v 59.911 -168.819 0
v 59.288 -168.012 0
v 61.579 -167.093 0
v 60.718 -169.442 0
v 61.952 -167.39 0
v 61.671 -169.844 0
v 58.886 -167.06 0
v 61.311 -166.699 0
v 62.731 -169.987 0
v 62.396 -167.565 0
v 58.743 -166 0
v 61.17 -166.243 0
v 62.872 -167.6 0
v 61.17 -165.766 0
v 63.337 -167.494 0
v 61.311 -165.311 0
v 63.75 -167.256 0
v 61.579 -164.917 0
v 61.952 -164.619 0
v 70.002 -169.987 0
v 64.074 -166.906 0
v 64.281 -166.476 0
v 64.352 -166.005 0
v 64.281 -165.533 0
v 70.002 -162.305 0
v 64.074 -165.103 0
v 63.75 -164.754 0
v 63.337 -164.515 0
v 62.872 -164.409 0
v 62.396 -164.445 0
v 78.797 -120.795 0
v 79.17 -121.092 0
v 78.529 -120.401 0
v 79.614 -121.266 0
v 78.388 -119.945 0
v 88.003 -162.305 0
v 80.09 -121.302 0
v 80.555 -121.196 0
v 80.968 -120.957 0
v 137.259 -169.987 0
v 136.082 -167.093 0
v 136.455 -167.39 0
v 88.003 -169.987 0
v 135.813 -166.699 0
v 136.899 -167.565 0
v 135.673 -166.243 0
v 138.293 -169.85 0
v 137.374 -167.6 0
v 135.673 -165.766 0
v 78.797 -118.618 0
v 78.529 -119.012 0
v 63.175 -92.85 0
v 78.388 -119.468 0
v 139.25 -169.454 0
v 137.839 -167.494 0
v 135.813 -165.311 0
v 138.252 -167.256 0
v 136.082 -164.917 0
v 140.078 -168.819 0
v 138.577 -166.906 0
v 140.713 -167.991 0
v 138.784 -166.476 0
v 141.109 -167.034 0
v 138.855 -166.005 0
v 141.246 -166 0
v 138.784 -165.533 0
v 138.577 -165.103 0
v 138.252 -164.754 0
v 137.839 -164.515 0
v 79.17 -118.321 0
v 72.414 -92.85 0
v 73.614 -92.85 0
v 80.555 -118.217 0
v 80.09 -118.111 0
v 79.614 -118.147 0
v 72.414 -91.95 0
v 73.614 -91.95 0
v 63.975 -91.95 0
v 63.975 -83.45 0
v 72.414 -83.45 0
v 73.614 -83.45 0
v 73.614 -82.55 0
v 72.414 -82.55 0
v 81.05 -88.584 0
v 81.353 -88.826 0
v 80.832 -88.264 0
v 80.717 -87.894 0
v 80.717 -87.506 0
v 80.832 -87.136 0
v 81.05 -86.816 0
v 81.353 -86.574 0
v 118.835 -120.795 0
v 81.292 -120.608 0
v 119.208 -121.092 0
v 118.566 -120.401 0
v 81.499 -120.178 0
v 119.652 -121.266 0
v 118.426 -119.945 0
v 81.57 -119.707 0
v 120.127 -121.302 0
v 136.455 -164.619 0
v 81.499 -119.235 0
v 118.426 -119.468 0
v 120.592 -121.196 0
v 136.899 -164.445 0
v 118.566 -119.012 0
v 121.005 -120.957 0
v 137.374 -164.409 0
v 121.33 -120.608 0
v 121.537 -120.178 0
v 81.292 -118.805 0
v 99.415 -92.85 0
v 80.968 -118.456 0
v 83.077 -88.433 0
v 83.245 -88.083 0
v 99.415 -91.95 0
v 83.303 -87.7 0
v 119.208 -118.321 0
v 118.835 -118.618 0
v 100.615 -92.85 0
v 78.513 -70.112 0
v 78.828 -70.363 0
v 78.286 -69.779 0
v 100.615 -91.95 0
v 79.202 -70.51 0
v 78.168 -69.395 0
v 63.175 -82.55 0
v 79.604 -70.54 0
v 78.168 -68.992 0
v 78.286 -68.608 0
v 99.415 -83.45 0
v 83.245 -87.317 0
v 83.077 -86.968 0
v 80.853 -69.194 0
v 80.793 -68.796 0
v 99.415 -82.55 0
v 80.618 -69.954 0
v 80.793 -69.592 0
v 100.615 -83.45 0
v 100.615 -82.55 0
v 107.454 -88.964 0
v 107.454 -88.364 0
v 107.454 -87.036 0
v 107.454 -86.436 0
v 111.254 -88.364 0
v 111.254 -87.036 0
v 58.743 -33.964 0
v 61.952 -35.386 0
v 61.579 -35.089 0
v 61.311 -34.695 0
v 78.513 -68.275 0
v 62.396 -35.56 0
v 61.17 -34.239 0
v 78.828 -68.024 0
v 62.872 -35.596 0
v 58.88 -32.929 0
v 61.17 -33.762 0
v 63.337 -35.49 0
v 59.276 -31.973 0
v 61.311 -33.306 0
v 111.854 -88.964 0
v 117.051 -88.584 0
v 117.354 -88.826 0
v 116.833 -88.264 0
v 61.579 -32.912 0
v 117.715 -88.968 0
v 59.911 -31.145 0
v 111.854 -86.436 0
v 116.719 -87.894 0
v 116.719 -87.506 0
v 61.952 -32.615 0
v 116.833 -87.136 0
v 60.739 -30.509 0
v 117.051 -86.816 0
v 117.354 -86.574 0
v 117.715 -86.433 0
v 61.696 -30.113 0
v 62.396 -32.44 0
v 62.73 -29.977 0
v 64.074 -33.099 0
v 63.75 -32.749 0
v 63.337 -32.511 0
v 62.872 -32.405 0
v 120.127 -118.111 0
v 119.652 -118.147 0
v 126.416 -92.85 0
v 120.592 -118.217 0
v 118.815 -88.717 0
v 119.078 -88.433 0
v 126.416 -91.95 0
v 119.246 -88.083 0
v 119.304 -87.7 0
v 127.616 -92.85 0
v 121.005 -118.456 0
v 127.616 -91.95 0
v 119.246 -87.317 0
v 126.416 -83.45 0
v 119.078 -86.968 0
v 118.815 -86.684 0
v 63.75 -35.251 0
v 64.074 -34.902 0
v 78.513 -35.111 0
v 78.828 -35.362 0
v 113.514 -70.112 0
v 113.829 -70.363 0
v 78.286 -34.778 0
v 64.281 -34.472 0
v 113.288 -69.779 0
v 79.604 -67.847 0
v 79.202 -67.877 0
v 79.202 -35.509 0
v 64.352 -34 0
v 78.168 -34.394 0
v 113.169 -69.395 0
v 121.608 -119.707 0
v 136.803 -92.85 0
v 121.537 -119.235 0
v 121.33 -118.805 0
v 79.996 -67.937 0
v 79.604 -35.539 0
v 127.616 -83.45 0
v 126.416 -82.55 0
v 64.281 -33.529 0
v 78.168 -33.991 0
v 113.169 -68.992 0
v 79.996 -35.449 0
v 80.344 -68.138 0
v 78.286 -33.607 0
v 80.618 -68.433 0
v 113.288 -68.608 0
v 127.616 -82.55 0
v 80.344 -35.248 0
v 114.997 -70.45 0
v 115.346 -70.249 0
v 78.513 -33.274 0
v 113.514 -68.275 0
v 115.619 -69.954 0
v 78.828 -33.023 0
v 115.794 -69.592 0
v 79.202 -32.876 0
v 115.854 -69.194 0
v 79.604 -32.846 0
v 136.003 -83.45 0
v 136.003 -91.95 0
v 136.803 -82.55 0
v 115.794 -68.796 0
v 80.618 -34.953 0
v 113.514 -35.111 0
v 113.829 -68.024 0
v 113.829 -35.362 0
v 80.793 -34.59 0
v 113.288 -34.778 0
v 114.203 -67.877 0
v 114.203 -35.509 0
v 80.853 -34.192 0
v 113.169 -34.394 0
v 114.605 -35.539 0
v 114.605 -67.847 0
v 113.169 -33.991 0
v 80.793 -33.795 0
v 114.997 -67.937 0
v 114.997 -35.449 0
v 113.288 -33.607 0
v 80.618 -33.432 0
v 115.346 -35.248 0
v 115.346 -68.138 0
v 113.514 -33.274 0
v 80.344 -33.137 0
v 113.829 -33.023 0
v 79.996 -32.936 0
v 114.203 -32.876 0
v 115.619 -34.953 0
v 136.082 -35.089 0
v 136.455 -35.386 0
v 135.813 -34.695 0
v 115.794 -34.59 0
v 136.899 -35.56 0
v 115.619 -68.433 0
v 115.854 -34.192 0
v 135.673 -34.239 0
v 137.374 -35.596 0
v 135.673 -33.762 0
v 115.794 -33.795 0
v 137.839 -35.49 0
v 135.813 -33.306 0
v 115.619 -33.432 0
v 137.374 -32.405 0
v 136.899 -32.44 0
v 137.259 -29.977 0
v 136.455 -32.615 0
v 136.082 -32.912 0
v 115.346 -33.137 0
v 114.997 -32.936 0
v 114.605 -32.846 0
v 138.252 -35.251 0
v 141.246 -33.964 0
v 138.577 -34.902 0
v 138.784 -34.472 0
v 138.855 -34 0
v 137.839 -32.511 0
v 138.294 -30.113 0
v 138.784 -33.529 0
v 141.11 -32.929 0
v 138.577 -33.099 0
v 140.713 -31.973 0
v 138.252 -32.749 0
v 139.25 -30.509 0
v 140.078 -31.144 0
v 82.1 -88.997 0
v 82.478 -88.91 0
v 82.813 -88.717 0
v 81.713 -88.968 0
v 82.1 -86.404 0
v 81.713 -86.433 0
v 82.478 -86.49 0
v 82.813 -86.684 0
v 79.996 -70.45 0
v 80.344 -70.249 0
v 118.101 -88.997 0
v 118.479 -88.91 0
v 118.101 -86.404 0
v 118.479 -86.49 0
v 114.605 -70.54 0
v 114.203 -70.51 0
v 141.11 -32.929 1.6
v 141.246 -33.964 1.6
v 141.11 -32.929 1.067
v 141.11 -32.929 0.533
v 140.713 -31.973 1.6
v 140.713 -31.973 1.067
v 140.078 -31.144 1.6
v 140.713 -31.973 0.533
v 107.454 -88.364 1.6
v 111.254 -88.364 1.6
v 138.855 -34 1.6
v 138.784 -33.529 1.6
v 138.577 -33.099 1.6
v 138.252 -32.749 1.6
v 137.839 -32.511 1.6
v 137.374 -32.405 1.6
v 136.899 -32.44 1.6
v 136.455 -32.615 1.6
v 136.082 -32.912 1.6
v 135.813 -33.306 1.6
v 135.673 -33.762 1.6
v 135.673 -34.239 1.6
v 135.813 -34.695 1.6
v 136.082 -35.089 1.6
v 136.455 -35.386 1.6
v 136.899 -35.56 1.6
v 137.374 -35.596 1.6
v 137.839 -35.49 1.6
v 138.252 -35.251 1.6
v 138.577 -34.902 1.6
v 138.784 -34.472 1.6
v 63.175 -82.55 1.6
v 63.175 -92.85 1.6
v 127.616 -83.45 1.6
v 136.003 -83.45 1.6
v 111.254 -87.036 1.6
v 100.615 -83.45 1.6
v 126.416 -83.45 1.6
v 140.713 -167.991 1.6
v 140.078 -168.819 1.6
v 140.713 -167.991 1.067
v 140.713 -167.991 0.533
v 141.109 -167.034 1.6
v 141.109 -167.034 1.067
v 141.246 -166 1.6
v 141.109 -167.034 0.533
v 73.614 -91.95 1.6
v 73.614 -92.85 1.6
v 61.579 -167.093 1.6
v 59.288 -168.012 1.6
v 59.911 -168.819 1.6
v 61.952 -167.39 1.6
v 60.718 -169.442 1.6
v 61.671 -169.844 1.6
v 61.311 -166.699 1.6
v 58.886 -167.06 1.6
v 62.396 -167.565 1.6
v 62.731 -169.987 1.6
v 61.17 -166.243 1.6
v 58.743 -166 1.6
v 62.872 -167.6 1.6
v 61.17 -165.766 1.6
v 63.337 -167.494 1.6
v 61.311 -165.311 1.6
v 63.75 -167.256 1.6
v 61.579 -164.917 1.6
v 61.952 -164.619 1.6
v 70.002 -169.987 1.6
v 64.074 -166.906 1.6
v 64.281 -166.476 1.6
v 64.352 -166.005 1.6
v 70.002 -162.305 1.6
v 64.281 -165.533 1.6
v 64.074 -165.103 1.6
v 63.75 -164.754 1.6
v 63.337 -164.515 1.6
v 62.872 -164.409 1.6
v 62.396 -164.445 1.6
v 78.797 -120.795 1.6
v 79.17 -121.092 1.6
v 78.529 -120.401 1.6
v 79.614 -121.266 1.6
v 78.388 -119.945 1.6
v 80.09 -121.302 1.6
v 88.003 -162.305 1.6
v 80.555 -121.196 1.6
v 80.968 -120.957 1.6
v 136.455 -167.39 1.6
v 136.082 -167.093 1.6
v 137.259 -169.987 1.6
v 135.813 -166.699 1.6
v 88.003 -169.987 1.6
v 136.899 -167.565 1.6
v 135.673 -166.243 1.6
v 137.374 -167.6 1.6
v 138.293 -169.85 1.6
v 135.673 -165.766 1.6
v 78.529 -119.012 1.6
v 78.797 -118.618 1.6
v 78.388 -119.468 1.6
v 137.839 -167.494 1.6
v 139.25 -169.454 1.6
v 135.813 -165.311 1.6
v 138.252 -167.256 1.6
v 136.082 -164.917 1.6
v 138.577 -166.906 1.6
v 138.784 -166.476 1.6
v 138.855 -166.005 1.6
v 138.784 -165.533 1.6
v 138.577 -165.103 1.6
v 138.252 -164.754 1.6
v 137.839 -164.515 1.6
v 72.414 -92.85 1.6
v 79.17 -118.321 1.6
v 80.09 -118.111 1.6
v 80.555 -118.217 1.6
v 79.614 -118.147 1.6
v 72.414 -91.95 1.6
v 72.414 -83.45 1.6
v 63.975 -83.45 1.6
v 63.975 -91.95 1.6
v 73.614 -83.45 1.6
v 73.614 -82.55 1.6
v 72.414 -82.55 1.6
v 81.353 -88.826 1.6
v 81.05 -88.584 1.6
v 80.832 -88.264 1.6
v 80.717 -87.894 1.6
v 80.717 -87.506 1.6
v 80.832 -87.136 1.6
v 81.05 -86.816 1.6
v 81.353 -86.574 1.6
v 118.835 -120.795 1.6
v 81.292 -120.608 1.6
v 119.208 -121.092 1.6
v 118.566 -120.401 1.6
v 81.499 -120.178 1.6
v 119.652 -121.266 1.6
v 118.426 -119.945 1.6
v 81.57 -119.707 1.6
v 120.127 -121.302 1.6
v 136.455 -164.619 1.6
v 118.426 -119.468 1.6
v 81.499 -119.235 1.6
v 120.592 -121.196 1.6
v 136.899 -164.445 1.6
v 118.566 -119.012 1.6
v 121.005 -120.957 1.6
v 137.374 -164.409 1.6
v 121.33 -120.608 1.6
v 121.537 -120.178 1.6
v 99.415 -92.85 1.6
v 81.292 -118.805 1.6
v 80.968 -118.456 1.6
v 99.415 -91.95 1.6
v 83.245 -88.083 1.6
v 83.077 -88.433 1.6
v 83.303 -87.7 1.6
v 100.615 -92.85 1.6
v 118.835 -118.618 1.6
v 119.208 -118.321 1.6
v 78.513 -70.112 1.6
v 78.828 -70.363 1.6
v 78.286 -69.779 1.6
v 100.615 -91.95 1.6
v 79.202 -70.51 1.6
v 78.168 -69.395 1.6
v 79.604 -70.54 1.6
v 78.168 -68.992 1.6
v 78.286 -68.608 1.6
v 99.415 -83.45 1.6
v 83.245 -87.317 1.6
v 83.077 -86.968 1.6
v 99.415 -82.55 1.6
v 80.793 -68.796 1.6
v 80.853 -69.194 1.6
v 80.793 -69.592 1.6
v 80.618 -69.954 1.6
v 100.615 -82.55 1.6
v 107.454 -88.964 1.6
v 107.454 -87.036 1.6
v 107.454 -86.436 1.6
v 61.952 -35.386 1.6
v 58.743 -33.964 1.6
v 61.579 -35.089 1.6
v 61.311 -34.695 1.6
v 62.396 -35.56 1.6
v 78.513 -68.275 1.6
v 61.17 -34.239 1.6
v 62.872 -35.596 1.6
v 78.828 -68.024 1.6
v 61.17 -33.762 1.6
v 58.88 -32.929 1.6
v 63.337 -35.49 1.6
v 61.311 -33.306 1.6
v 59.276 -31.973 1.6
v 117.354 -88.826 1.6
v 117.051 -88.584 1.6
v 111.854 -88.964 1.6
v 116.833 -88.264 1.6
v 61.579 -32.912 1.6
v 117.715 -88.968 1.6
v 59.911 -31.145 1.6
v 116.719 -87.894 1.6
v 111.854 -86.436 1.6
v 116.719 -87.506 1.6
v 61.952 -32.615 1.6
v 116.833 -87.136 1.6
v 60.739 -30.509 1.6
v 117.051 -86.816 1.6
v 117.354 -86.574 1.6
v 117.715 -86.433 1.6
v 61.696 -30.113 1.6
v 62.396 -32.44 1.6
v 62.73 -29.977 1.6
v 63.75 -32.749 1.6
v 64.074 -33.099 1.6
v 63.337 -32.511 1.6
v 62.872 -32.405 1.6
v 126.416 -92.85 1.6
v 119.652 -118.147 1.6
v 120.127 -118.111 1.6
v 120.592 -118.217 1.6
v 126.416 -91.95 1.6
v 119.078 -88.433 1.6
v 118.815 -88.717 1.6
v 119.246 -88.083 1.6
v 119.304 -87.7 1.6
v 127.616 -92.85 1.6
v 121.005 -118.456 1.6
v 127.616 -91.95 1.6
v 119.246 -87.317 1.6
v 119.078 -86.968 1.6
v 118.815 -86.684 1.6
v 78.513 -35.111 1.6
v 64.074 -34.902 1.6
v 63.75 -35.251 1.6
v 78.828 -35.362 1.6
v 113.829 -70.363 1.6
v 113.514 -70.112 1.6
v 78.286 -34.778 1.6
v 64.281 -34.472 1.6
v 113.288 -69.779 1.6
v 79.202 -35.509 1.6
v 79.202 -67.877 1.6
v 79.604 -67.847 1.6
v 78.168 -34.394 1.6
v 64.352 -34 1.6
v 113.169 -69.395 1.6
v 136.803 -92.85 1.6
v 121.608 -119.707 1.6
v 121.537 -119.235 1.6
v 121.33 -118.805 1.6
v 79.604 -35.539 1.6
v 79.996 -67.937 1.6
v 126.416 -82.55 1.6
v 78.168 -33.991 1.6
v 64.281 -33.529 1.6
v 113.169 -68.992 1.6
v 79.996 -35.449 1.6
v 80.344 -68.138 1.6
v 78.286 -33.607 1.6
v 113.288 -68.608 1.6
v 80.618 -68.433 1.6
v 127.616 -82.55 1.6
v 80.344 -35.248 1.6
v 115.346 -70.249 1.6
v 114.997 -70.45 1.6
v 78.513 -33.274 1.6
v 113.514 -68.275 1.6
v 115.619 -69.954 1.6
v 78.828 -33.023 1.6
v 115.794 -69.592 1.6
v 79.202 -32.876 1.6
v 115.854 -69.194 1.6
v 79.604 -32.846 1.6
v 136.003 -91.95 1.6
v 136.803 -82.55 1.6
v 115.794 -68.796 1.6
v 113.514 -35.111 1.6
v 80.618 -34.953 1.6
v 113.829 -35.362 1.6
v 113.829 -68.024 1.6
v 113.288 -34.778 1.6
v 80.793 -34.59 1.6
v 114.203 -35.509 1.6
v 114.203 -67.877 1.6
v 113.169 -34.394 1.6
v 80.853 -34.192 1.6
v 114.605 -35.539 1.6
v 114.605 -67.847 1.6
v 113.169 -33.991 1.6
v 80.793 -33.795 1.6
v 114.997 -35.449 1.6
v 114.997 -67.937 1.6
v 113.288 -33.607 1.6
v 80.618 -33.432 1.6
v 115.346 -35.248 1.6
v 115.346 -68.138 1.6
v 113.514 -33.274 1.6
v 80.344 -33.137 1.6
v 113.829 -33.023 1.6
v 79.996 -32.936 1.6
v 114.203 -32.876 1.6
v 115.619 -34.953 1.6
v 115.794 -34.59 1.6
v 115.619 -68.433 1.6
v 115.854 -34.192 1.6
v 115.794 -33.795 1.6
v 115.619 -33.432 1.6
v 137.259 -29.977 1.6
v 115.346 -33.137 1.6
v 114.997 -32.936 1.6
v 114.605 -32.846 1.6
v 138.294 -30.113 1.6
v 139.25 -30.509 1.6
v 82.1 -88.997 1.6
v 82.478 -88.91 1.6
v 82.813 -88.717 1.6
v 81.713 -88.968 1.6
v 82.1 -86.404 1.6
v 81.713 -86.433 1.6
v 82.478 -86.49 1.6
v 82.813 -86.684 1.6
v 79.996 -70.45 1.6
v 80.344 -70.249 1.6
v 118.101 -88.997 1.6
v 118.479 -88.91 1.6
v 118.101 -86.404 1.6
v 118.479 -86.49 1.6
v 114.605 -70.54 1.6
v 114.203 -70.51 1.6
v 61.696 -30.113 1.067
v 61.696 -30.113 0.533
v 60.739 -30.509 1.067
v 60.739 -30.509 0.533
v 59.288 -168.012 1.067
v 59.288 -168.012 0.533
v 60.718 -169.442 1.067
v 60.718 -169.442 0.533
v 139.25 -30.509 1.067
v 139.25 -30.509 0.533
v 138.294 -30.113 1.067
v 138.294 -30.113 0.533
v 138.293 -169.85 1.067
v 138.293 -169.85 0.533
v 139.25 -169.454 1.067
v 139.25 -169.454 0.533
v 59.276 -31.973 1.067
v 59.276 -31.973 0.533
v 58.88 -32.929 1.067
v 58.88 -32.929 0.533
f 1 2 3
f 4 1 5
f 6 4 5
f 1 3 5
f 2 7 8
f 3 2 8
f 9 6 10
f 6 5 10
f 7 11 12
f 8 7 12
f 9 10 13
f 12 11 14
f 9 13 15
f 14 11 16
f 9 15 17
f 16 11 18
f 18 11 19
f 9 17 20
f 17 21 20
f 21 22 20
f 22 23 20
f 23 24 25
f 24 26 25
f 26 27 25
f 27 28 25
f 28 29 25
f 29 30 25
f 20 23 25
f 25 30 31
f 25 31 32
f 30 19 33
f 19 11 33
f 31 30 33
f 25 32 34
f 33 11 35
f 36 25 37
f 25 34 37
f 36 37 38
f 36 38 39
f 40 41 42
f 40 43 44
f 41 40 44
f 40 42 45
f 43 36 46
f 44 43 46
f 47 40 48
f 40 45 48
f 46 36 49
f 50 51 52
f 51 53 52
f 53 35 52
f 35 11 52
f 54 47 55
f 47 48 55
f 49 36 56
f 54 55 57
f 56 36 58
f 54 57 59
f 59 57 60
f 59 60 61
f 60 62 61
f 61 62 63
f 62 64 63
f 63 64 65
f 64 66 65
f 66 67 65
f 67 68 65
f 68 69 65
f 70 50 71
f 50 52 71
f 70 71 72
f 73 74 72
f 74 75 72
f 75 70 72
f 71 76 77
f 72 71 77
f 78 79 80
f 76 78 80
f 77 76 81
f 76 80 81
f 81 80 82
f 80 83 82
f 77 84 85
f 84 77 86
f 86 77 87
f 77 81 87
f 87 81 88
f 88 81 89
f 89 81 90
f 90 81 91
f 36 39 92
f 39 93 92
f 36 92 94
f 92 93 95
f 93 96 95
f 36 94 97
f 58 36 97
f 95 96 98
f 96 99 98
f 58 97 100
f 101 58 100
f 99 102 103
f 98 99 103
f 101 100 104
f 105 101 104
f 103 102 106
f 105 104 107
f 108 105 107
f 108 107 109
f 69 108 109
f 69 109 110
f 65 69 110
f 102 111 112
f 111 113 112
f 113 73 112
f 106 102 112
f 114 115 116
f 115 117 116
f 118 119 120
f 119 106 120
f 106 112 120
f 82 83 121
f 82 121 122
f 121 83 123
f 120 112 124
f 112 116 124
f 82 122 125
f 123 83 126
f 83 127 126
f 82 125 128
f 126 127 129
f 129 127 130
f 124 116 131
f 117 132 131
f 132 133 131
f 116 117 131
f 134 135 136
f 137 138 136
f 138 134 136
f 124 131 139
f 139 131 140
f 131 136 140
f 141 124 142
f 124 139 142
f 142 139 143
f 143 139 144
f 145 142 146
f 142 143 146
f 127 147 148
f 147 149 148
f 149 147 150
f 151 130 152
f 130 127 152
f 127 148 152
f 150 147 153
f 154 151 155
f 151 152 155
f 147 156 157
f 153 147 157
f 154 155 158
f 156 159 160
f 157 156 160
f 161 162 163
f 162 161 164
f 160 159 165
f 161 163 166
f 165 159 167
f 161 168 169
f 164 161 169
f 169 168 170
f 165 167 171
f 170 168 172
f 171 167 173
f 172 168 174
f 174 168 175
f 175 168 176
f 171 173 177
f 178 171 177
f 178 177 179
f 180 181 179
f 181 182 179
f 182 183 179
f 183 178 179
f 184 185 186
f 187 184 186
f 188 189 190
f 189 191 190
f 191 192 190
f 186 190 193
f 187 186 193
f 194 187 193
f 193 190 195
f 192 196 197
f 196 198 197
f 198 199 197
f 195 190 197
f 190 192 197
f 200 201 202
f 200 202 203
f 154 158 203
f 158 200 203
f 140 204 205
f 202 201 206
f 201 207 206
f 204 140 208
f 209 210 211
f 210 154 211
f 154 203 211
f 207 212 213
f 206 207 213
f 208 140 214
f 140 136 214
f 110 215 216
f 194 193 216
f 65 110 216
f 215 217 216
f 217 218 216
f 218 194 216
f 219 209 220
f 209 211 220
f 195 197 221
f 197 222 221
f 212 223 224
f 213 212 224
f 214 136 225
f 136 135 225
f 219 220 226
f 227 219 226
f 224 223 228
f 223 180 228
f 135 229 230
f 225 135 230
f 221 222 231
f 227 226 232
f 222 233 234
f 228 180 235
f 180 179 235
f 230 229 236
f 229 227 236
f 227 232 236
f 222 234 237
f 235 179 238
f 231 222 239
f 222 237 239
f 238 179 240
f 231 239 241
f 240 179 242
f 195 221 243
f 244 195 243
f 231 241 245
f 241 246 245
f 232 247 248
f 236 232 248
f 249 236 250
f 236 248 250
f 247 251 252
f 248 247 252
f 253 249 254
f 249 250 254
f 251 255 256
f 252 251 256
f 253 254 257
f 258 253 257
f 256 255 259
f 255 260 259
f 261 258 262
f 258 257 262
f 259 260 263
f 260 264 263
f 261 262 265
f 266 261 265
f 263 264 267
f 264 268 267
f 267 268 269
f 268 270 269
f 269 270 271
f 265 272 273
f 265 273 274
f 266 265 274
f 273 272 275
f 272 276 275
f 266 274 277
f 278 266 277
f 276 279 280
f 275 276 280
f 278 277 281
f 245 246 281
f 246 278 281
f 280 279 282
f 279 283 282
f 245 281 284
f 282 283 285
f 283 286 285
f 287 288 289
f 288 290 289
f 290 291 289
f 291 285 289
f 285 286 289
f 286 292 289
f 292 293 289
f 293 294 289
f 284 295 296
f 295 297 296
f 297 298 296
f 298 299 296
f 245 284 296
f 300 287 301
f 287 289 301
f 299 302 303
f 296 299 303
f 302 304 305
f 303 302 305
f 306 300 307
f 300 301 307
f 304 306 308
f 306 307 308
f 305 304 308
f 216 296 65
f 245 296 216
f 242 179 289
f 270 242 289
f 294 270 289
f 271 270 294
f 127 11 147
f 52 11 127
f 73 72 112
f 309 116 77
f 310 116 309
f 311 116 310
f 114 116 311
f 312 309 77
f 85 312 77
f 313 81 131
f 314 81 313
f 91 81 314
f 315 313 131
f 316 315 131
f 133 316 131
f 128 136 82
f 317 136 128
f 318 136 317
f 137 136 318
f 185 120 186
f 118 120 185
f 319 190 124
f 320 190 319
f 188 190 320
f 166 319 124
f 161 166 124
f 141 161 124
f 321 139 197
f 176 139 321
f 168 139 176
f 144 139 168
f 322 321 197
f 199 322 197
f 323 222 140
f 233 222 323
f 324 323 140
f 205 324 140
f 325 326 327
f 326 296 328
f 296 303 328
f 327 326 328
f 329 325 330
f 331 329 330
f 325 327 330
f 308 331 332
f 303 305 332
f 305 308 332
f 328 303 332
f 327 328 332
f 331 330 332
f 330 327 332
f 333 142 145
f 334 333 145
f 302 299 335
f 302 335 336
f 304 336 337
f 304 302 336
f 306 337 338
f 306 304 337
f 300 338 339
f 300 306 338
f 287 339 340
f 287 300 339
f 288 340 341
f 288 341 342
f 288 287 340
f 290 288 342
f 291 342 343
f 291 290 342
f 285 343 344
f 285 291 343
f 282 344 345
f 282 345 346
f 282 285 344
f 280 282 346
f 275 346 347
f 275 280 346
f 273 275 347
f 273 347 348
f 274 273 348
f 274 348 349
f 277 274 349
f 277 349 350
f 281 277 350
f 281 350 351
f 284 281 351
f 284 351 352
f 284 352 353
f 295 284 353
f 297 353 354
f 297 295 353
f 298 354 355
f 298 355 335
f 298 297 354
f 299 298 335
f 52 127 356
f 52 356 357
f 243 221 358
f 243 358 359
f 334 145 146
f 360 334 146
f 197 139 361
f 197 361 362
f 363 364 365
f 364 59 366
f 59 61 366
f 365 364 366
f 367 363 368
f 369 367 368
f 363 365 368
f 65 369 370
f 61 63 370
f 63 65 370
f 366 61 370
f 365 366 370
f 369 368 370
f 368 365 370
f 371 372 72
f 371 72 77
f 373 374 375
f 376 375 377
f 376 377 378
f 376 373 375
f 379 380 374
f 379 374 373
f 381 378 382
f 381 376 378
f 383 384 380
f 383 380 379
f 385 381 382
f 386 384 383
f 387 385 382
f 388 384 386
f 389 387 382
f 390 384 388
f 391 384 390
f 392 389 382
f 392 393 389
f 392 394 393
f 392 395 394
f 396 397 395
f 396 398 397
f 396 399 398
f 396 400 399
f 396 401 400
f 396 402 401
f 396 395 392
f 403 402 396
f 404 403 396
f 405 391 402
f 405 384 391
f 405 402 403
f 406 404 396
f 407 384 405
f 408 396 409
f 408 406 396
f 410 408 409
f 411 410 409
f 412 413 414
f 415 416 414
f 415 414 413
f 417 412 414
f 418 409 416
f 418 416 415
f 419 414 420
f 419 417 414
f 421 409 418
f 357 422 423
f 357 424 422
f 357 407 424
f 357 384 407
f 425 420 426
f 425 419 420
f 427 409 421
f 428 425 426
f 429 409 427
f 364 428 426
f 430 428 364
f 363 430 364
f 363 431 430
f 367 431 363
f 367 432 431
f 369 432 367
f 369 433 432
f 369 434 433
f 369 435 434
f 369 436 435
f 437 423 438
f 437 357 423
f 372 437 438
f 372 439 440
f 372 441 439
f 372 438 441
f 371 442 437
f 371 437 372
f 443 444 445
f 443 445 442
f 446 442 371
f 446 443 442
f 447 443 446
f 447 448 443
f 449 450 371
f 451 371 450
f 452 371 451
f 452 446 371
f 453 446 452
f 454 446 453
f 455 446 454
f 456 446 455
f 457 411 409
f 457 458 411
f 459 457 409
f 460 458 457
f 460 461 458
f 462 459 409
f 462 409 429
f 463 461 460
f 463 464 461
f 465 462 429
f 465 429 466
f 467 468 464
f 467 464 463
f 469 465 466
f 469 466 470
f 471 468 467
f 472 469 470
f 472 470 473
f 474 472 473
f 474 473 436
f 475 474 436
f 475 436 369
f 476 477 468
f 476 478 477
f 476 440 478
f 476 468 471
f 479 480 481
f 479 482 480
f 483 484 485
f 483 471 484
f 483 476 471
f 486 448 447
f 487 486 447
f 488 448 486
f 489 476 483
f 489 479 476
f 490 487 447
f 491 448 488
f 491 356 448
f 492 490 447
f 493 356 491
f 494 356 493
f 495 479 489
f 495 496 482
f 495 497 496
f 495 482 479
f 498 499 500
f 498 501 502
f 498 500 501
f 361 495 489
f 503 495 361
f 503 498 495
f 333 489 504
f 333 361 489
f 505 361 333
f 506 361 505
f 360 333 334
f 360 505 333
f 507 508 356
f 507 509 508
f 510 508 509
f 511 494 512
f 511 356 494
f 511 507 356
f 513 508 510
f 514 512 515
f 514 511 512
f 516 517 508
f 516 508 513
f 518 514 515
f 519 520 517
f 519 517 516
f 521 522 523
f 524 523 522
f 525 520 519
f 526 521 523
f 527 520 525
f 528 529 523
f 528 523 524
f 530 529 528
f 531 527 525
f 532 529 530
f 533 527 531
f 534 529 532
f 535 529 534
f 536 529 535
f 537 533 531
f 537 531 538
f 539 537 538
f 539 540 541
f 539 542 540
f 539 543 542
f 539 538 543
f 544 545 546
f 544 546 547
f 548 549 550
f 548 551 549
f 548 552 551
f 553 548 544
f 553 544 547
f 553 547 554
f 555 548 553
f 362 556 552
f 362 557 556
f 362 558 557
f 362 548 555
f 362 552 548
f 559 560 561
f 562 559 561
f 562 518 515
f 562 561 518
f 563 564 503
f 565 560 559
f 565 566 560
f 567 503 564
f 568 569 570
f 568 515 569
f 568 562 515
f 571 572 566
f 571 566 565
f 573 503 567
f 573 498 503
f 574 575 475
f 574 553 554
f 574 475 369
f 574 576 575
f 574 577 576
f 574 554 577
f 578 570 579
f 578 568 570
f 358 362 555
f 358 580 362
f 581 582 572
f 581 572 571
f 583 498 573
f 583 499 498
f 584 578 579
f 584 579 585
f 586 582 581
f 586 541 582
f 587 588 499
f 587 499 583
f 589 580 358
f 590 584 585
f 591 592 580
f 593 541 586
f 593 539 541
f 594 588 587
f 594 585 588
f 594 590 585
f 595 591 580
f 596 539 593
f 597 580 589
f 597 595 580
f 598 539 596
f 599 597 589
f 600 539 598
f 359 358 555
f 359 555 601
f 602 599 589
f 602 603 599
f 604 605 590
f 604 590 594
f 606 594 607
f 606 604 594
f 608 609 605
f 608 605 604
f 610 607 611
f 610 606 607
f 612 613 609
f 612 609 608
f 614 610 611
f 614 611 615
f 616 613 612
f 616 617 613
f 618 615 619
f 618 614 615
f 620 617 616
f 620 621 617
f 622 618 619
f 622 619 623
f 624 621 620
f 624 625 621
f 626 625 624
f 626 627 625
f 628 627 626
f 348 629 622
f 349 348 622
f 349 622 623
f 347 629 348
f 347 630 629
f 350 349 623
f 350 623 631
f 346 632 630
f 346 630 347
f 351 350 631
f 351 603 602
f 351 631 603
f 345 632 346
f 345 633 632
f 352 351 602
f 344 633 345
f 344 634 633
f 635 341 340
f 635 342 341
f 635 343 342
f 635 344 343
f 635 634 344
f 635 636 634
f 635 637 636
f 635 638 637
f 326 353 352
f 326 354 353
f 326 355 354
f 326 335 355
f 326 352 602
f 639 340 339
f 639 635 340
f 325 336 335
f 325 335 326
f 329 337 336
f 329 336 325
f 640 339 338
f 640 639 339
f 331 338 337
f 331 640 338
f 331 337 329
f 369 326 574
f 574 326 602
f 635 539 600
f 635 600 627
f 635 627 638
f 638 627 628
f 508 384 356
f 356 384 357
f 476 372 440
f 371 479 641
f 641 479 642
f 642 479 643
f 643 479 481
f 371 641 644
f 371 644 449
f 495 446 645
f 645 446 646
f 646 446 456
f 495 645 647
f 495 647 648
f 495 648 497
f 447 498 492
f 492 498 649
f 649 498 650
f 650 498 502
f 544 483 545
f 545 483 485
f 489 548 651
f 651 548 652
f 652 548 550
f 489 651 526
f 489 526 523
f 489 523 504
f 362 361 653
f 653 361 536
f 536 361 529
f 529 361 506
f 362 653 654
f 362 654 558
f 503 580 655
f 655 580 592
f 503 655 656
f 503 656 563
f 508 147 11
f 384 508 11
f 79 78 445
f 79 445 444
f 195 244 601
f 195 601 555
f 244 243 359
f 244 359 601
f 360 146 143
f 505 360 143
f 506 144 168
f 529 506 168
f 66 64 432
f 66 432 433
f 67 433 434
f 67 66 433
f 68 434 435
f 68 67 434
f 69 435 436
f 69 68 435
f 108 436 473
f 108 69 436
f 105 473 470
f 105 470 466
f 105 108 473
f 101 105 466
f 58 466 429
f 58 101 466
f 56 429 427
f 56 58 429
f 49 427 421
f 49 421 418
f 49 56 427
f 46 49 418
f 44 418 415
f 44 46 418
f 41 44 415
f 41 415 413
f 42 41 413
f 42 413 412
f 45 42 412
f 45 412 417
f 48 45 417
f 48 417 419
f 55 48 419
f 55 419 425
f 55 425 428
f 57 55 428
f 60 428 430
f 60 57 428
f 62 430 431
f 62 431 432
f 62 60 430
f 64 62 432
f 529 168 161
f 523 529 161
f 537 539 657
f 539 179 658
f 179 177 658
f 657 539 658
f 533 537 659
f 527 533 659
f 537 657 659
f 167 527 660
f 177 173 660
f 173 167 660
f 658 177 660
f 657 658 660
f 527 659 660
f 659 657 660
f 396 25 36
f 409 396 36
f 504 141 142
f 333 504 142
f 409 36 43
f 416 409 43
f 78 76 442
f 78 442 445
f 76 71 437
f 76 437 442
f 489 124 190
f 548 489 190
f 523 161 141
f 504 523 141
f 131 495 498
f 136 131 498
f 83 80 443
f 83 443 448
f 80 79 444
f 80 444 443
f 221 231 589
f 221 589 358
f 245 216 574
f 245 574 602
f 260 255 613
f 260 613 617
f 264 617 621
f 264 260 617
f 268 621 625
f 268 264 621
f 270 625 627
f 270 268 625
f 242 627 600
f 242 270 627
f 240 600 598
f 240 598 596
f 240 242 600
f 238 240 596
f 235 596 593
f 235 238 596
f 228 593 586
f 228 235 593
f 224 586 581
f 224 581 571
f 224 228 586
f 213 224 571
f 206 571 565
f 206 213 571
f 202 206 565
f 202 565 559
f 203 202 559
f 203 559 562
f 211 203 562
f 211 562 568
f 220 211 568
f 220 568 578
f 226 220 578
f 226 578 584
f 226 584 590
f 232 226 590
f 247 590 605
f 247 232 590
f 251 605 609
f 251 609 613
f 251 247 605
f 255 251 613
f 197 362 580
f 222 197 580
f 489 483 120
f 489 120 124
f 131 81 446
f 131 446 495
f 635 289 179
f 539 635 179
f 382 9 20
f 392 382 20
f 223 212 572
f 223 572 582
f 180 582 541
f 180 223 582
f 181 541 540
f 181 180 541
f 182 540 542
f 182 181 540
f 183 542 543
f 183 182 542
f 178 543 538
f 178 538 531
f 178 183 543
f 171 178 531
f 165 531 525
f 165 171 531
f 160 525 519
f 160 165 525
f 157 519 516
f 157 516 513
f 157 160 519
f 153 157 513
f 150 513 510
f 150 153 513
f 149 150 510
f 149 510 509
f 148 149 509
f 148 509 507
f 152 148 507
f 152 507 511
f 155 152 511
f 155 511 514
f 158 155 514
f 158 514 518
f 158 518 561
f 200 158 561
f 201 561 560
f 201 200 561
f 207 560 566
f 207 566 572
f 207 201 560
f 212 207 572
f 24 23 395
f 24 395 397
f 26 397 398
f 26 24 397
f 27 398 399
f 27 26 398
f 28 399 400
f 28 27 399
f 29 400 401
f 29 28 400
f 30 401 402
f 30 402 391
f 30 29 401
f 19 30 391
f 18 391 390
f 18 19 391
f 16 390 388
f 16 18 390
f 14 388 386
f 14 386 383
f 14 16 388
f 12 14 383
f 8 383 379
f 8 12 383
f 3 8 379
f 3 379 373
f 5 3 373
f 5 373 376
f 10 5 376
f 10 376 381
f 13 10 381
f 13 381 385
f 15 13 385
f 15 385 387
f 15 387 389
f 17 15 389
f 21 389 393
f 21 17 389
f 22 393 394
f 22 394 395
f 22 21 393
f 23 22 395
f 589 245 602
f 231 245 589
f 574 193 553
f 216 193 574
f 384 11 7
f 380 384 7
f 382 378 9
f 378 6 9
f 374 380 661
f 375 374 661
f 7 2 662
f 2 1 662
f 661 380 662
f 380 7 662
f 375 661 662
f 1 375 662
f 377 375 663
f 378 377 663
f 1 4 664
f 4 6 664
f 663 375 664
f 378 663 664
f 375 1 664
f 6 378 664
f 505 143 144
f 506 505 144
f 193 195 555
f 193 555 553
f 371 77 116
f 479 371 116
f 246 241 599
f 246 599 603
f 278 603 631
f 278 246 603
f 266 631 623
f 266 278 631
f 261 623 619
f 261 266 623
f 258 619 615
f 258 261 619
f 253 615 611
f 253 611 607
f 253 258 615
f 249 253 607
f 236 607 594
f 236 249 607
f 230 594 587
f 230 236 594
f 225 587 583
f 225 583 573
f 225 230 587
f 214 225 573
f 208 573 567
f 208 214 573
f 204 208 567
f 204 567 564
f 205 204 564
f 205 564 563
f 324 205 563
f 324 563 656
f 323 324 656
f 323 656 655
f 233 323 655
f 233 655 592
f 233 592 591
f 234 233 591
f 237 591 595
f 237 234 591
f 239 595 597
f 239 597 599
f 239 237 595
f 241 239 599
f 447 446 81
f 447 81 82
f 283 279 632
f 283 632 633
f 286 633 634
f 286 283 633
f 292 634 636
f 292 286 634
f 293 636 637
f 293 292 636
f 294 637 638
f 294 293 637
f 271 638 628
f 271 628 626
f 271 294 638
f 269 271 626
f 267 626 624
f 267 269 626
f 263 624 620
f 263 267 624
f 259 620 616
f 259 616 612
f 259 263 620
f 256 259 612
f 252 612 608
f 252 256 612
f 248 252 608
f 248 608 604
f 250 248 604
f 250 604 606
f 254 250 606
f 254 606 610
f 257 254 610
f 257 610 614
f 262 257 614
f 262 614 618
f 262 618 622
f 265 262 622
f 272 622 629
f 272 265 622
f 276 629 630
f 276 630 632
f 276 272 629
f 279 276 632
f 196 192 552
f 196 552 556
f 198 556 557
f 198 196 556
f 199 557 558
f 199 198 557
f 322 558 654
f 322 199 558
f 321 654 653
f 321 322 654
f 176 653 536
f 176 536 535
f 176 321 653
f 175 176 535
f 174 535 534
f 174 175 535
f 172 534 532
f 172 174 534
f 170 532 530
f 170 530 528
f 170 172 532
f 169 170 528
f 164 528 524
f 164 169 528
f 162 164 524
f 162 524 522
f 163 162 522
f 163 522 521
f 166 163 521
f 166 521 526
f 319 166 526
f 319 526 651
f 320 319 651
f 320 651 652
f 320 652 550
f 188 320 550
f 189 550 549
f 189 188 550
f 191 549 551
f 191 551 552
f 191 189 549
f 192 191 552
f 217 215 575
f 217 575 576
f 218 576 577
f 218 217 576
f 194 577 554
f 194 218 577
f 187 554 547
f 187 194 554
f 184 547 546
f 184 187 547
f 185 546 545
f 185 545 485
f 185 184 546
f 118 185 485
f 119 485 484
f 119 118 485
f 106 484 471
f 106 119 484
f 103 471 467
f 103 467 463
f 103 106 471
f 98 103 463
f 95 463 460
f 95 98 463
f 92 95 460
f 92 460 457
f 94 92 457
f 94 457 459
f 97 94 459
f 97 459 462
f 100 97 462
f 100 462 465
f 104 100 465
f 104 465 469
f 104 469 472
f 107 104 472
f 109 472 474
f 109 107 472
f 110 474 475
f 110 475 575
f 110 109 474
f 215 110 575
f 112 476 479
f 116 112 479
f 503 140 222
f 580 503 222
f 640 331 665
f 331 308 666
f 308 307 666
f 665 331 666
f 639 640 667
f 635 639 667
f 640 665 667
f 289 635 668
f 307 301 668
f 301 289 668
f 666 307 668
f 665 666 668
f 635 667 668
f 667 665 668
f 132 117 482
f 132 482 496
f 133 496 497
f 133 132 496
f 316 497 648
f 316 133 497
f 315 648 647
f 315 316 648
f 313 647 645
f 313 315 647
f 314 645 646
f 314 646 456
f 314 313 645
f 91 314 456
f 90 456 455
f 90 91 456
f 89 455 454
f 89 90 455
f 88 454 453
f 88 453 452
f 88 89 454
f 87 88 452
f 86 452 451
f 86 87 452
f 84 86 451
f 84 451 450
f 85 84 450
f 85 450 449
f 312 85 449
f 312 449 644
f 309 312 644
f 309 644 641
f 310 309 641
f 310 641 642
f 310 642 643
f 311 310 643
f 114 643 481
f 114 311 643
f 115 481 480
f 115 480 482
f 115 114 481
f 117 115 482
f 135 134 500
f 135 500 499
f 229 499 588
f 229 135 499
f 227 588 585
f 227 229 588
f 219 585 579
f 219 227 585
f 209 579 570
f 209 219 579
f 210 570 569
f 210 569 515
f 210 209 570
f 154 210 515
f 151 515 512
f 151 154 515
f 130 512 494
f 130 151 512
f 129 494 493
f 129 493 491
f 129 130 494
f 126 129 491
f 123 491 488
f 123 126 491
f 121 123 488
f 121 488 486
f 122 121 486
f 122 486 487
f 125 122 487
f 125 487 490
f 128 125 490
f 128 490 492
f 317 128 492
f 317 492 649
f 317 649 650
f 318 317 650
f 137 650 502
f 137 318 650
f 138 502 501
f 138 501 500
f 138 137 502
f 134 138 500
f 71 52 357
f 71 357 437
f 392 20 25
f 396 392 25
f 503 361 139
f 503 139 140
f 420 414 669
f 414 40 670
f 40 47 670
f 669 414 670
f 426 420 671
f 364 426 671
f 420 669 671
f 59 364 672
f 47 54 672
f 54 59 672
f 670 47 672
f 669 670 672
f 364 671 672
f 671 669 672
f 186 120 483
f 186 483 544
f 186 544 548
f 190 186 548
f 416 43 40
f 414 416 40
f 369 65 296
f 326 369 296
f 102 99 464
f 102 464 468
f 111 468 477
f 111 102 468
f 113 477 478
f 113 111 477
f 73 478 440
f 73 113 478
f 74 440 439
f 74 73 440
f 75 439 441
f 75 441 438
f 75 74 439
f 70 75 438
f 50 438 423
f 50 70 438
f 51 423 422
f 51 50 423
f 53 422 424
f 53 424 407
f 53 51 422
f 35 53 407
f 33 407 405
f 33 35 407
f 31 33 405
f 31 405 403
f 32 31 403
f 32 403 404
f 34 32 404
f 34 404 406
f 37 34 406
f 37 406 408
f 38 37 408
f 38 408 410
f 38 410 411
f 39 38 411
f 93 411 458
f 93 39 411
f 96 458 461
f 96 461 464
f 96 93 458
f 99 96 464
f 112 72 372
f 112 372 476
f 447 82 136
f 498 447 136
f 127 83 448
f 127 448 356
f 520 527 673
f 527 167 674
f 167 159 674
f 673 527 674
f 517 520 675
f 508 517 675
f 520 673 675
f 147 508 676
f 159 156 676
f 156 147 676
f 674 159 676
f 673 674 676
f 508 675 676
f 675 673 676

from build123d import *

# Parameters (mm, degrees)
MODEL_R             = 1.3
MODEL_R_2           = 1.35
MODEL_R_3           = 1.6
MODEL_W             = 25.800871102
MODEL_H             = 0.899853509
MODEL_W_2           = 25.800870102
MODEL_H_2           = 0.900030515
BOSS_EXTRUDE1_DEPTH = 1.6


with BuildPart() as part:
    # Model → Boss-Extrude1 (new body)
    with BuildSketch(Plane.XY):
        with BuildLine():
            Line((70.002361624, -162.304686543), (88.002880425, -162.304686543))
            Line((88.002880425, -162.304686543), (88.002880425, -169.986796467))
            Line((88.002880425, -169.986796467), (137.258712697, -169.986796467))
            add(Edge.make_bspline(
                [(137.258712697, -169.986796467), (138.316181375, -169.986784466), (139.330341633, -169.566711691), (140.078087155, -168.81897017)],
                knots=[0, 0, 0, 0, 1, 1, 1, 1], degree=3))
            add(Edge.make_bspline(
                [(140.078087155, -168.81897017), (140.825832676, -168.071228648), (141.245910452, -167.057070391), (141.246087457, -165.999601713)],
                knots=[0, 0, 0, 0, 1, 1, 1, 1], degree=3))
            Line((141.246087457, -165.999601713), (141.246264463, -33.963752791))
            add(Edge.make_bspline(
                [(141.246264463, -33.963752791), (141.246219462, -32.906240112), (140.826140686, -31.892031852), (140.078372164, -31.14425033)],
                knots=[0, 0, 0, 0, 1, 1, 1, 1], degree=3))
            add(Edge.make_bspline(
                [(140.078372164, -31.14425033), (139.330603642, -30.396469808), (138.316402383, -29.976373031), (137.258889703, -29.976735043)],
                knots=[0, 0, 0, 0, 1, 1, 1, 1], degree=3))
            Line((137.258889703, -29.976735043), (62.730494654, -29.976735043))
            add(Edge.make_bspline(
                [(62.730494654, -29.976735043), (61.673022976, -29.976726043), (60.658862718, -30.396804818), (59.911117197, -31.14455134)],
                knots=[0, 0, 0, 0, 1, 1, 1, 1], degree=3))
            add(Edge.make_bspline(
                [(59.911117197, -31.14455134), (59.163396148, -31.892320333), (58.743351208, -32.906494777), (58.743388403, -33.963966454)],
                knots=[0, 0, 0, 0, 1, 1, 1, 1], degree=3))
            Line((58.743388403, -33.963966454), (58.743211397, -165.999601713))
            add(Edge.make_bspline(
                [(58.743211397, -165.999601713), (58.743209397, -168.201763929), (60.52841994, -169.986947472), (62.730583157, -169.986616461)],
                knots=[0, 0, 0, 0, 1, 1, 1, 1], degree=3))
            Line((62.730583157, -169.986616461), (70.002361624, -169.986796467))
            Line((70.002361624, -169.986796467), (70.002361624, -162.304686543))
        make_face()
        with Locations((118.003980767, -87.700241)):
            Circle(MODEL_R, mode=Mode.SUBTRACT)
        with Locations((82.00276616, -87.700241)):
            Circle(MODEL_R, mode=Mode.SUBTRACT)
        with Locations((114.503861986, -69.193633103)):
            Circle(MODEL_R_2, mode=Mode.SUBTRACT)
        with Locations((79.502681173, -69.193633103)):
            Circle(MODEL_R_2, mode=Mode.SUBTRACT)
        with Locations((79.502681173, -34.192456291)):
            Circle(MODEL_R_2, mode=Mode.SUBTRACT)
        with Locations((114.503861986, -34.192456291)):
            Circle(MODEL_R_2, mode=Mode.SUBTRACT)
        with Locations((62.752116863, -34.000356992)):
            Circle(MODEL_R_3, mode=Mode.SUBTRACT)
        with Locations((137.254631064, -34.000356992)):
            Circle(MODEL_R_3, mode=Mode.SUBTRACT)
        with Locations((137.254631064, -166.004811883)):
            Circle(MODEL_R_3, mode=Mode.SUBTRACT)
        with Locations((62.752116863, -166.004811883)):
            Circle(MODEL_R_3, mode=Mode.SUBTRACT)
        with Locations((79.970369511, -119.70654813)):
            Circle(MODEL_R_3, mode=Mode.SUBTRACT)
        with Locations((120.007632474, -119.70654813)):
            Circle(MODEL_R_3, mode=Mode.SUBTRACT)
        Polygon((72.414426725, -82.550246114), (63.175439746, -82.550246114), (63.175439746, -92.850417893), (72.414426725, -92.850417893), (72.414426725, -91.950387378), (63.975466981, -91.950387378), (63.975466981, -83.450099623), (72.414426725, -83.450099623), align=None, mode=Mode.SUBTRACT)
        with Locations((86.514902629, -83.000172869)):
            Rectangle(MODEL_W, MODEL_H, mode=Mode.SUBTRACT)
        with Locations((113.515809584, -83.000172869)):
            Rectangle(MODEL_W_2, MODEL_H, mode=Mode.SUBTRACT)
        with Locations((86.514902629, -92.400402636)):
            Rectangle(MODEL_W, MODEL_H_2, mode=Mode.SUBTRACT)
        with Locations((113.515809584, -92.400402636)):
            Rectangle(MODEL_W_2, MODEL_H_2, mode=Mode.SUBTRACT)
        Polygon((127.616285988, -91.950387378), (127.616285988, -92.850417893), (136.80289525, -92.850417893), (136.80289525, -82.550246114), (127.616285988, -82.550246114), (127.616285988, -83.450099623), (136.002869014, -83.450099623), (136.002869014, -91.950387378), align=None, mode=Mode.SUBTRACT)
        Polygon((107.453624783, -86.436359553), (111.85377408, -86.436359553), (111.85377408, -88.964126448), (107.453624783, -88.964126448), (107.453624783, -88.364106771), (111.253753403, -88.364106771), (111.253753403, -87.03638023), (107.453624783, -87.03638023), align=None, mode=Mode.SUBTRACT)
    extrude(amount=BOSS_EXTRUDE1_DEPTH)


solid = part.part
